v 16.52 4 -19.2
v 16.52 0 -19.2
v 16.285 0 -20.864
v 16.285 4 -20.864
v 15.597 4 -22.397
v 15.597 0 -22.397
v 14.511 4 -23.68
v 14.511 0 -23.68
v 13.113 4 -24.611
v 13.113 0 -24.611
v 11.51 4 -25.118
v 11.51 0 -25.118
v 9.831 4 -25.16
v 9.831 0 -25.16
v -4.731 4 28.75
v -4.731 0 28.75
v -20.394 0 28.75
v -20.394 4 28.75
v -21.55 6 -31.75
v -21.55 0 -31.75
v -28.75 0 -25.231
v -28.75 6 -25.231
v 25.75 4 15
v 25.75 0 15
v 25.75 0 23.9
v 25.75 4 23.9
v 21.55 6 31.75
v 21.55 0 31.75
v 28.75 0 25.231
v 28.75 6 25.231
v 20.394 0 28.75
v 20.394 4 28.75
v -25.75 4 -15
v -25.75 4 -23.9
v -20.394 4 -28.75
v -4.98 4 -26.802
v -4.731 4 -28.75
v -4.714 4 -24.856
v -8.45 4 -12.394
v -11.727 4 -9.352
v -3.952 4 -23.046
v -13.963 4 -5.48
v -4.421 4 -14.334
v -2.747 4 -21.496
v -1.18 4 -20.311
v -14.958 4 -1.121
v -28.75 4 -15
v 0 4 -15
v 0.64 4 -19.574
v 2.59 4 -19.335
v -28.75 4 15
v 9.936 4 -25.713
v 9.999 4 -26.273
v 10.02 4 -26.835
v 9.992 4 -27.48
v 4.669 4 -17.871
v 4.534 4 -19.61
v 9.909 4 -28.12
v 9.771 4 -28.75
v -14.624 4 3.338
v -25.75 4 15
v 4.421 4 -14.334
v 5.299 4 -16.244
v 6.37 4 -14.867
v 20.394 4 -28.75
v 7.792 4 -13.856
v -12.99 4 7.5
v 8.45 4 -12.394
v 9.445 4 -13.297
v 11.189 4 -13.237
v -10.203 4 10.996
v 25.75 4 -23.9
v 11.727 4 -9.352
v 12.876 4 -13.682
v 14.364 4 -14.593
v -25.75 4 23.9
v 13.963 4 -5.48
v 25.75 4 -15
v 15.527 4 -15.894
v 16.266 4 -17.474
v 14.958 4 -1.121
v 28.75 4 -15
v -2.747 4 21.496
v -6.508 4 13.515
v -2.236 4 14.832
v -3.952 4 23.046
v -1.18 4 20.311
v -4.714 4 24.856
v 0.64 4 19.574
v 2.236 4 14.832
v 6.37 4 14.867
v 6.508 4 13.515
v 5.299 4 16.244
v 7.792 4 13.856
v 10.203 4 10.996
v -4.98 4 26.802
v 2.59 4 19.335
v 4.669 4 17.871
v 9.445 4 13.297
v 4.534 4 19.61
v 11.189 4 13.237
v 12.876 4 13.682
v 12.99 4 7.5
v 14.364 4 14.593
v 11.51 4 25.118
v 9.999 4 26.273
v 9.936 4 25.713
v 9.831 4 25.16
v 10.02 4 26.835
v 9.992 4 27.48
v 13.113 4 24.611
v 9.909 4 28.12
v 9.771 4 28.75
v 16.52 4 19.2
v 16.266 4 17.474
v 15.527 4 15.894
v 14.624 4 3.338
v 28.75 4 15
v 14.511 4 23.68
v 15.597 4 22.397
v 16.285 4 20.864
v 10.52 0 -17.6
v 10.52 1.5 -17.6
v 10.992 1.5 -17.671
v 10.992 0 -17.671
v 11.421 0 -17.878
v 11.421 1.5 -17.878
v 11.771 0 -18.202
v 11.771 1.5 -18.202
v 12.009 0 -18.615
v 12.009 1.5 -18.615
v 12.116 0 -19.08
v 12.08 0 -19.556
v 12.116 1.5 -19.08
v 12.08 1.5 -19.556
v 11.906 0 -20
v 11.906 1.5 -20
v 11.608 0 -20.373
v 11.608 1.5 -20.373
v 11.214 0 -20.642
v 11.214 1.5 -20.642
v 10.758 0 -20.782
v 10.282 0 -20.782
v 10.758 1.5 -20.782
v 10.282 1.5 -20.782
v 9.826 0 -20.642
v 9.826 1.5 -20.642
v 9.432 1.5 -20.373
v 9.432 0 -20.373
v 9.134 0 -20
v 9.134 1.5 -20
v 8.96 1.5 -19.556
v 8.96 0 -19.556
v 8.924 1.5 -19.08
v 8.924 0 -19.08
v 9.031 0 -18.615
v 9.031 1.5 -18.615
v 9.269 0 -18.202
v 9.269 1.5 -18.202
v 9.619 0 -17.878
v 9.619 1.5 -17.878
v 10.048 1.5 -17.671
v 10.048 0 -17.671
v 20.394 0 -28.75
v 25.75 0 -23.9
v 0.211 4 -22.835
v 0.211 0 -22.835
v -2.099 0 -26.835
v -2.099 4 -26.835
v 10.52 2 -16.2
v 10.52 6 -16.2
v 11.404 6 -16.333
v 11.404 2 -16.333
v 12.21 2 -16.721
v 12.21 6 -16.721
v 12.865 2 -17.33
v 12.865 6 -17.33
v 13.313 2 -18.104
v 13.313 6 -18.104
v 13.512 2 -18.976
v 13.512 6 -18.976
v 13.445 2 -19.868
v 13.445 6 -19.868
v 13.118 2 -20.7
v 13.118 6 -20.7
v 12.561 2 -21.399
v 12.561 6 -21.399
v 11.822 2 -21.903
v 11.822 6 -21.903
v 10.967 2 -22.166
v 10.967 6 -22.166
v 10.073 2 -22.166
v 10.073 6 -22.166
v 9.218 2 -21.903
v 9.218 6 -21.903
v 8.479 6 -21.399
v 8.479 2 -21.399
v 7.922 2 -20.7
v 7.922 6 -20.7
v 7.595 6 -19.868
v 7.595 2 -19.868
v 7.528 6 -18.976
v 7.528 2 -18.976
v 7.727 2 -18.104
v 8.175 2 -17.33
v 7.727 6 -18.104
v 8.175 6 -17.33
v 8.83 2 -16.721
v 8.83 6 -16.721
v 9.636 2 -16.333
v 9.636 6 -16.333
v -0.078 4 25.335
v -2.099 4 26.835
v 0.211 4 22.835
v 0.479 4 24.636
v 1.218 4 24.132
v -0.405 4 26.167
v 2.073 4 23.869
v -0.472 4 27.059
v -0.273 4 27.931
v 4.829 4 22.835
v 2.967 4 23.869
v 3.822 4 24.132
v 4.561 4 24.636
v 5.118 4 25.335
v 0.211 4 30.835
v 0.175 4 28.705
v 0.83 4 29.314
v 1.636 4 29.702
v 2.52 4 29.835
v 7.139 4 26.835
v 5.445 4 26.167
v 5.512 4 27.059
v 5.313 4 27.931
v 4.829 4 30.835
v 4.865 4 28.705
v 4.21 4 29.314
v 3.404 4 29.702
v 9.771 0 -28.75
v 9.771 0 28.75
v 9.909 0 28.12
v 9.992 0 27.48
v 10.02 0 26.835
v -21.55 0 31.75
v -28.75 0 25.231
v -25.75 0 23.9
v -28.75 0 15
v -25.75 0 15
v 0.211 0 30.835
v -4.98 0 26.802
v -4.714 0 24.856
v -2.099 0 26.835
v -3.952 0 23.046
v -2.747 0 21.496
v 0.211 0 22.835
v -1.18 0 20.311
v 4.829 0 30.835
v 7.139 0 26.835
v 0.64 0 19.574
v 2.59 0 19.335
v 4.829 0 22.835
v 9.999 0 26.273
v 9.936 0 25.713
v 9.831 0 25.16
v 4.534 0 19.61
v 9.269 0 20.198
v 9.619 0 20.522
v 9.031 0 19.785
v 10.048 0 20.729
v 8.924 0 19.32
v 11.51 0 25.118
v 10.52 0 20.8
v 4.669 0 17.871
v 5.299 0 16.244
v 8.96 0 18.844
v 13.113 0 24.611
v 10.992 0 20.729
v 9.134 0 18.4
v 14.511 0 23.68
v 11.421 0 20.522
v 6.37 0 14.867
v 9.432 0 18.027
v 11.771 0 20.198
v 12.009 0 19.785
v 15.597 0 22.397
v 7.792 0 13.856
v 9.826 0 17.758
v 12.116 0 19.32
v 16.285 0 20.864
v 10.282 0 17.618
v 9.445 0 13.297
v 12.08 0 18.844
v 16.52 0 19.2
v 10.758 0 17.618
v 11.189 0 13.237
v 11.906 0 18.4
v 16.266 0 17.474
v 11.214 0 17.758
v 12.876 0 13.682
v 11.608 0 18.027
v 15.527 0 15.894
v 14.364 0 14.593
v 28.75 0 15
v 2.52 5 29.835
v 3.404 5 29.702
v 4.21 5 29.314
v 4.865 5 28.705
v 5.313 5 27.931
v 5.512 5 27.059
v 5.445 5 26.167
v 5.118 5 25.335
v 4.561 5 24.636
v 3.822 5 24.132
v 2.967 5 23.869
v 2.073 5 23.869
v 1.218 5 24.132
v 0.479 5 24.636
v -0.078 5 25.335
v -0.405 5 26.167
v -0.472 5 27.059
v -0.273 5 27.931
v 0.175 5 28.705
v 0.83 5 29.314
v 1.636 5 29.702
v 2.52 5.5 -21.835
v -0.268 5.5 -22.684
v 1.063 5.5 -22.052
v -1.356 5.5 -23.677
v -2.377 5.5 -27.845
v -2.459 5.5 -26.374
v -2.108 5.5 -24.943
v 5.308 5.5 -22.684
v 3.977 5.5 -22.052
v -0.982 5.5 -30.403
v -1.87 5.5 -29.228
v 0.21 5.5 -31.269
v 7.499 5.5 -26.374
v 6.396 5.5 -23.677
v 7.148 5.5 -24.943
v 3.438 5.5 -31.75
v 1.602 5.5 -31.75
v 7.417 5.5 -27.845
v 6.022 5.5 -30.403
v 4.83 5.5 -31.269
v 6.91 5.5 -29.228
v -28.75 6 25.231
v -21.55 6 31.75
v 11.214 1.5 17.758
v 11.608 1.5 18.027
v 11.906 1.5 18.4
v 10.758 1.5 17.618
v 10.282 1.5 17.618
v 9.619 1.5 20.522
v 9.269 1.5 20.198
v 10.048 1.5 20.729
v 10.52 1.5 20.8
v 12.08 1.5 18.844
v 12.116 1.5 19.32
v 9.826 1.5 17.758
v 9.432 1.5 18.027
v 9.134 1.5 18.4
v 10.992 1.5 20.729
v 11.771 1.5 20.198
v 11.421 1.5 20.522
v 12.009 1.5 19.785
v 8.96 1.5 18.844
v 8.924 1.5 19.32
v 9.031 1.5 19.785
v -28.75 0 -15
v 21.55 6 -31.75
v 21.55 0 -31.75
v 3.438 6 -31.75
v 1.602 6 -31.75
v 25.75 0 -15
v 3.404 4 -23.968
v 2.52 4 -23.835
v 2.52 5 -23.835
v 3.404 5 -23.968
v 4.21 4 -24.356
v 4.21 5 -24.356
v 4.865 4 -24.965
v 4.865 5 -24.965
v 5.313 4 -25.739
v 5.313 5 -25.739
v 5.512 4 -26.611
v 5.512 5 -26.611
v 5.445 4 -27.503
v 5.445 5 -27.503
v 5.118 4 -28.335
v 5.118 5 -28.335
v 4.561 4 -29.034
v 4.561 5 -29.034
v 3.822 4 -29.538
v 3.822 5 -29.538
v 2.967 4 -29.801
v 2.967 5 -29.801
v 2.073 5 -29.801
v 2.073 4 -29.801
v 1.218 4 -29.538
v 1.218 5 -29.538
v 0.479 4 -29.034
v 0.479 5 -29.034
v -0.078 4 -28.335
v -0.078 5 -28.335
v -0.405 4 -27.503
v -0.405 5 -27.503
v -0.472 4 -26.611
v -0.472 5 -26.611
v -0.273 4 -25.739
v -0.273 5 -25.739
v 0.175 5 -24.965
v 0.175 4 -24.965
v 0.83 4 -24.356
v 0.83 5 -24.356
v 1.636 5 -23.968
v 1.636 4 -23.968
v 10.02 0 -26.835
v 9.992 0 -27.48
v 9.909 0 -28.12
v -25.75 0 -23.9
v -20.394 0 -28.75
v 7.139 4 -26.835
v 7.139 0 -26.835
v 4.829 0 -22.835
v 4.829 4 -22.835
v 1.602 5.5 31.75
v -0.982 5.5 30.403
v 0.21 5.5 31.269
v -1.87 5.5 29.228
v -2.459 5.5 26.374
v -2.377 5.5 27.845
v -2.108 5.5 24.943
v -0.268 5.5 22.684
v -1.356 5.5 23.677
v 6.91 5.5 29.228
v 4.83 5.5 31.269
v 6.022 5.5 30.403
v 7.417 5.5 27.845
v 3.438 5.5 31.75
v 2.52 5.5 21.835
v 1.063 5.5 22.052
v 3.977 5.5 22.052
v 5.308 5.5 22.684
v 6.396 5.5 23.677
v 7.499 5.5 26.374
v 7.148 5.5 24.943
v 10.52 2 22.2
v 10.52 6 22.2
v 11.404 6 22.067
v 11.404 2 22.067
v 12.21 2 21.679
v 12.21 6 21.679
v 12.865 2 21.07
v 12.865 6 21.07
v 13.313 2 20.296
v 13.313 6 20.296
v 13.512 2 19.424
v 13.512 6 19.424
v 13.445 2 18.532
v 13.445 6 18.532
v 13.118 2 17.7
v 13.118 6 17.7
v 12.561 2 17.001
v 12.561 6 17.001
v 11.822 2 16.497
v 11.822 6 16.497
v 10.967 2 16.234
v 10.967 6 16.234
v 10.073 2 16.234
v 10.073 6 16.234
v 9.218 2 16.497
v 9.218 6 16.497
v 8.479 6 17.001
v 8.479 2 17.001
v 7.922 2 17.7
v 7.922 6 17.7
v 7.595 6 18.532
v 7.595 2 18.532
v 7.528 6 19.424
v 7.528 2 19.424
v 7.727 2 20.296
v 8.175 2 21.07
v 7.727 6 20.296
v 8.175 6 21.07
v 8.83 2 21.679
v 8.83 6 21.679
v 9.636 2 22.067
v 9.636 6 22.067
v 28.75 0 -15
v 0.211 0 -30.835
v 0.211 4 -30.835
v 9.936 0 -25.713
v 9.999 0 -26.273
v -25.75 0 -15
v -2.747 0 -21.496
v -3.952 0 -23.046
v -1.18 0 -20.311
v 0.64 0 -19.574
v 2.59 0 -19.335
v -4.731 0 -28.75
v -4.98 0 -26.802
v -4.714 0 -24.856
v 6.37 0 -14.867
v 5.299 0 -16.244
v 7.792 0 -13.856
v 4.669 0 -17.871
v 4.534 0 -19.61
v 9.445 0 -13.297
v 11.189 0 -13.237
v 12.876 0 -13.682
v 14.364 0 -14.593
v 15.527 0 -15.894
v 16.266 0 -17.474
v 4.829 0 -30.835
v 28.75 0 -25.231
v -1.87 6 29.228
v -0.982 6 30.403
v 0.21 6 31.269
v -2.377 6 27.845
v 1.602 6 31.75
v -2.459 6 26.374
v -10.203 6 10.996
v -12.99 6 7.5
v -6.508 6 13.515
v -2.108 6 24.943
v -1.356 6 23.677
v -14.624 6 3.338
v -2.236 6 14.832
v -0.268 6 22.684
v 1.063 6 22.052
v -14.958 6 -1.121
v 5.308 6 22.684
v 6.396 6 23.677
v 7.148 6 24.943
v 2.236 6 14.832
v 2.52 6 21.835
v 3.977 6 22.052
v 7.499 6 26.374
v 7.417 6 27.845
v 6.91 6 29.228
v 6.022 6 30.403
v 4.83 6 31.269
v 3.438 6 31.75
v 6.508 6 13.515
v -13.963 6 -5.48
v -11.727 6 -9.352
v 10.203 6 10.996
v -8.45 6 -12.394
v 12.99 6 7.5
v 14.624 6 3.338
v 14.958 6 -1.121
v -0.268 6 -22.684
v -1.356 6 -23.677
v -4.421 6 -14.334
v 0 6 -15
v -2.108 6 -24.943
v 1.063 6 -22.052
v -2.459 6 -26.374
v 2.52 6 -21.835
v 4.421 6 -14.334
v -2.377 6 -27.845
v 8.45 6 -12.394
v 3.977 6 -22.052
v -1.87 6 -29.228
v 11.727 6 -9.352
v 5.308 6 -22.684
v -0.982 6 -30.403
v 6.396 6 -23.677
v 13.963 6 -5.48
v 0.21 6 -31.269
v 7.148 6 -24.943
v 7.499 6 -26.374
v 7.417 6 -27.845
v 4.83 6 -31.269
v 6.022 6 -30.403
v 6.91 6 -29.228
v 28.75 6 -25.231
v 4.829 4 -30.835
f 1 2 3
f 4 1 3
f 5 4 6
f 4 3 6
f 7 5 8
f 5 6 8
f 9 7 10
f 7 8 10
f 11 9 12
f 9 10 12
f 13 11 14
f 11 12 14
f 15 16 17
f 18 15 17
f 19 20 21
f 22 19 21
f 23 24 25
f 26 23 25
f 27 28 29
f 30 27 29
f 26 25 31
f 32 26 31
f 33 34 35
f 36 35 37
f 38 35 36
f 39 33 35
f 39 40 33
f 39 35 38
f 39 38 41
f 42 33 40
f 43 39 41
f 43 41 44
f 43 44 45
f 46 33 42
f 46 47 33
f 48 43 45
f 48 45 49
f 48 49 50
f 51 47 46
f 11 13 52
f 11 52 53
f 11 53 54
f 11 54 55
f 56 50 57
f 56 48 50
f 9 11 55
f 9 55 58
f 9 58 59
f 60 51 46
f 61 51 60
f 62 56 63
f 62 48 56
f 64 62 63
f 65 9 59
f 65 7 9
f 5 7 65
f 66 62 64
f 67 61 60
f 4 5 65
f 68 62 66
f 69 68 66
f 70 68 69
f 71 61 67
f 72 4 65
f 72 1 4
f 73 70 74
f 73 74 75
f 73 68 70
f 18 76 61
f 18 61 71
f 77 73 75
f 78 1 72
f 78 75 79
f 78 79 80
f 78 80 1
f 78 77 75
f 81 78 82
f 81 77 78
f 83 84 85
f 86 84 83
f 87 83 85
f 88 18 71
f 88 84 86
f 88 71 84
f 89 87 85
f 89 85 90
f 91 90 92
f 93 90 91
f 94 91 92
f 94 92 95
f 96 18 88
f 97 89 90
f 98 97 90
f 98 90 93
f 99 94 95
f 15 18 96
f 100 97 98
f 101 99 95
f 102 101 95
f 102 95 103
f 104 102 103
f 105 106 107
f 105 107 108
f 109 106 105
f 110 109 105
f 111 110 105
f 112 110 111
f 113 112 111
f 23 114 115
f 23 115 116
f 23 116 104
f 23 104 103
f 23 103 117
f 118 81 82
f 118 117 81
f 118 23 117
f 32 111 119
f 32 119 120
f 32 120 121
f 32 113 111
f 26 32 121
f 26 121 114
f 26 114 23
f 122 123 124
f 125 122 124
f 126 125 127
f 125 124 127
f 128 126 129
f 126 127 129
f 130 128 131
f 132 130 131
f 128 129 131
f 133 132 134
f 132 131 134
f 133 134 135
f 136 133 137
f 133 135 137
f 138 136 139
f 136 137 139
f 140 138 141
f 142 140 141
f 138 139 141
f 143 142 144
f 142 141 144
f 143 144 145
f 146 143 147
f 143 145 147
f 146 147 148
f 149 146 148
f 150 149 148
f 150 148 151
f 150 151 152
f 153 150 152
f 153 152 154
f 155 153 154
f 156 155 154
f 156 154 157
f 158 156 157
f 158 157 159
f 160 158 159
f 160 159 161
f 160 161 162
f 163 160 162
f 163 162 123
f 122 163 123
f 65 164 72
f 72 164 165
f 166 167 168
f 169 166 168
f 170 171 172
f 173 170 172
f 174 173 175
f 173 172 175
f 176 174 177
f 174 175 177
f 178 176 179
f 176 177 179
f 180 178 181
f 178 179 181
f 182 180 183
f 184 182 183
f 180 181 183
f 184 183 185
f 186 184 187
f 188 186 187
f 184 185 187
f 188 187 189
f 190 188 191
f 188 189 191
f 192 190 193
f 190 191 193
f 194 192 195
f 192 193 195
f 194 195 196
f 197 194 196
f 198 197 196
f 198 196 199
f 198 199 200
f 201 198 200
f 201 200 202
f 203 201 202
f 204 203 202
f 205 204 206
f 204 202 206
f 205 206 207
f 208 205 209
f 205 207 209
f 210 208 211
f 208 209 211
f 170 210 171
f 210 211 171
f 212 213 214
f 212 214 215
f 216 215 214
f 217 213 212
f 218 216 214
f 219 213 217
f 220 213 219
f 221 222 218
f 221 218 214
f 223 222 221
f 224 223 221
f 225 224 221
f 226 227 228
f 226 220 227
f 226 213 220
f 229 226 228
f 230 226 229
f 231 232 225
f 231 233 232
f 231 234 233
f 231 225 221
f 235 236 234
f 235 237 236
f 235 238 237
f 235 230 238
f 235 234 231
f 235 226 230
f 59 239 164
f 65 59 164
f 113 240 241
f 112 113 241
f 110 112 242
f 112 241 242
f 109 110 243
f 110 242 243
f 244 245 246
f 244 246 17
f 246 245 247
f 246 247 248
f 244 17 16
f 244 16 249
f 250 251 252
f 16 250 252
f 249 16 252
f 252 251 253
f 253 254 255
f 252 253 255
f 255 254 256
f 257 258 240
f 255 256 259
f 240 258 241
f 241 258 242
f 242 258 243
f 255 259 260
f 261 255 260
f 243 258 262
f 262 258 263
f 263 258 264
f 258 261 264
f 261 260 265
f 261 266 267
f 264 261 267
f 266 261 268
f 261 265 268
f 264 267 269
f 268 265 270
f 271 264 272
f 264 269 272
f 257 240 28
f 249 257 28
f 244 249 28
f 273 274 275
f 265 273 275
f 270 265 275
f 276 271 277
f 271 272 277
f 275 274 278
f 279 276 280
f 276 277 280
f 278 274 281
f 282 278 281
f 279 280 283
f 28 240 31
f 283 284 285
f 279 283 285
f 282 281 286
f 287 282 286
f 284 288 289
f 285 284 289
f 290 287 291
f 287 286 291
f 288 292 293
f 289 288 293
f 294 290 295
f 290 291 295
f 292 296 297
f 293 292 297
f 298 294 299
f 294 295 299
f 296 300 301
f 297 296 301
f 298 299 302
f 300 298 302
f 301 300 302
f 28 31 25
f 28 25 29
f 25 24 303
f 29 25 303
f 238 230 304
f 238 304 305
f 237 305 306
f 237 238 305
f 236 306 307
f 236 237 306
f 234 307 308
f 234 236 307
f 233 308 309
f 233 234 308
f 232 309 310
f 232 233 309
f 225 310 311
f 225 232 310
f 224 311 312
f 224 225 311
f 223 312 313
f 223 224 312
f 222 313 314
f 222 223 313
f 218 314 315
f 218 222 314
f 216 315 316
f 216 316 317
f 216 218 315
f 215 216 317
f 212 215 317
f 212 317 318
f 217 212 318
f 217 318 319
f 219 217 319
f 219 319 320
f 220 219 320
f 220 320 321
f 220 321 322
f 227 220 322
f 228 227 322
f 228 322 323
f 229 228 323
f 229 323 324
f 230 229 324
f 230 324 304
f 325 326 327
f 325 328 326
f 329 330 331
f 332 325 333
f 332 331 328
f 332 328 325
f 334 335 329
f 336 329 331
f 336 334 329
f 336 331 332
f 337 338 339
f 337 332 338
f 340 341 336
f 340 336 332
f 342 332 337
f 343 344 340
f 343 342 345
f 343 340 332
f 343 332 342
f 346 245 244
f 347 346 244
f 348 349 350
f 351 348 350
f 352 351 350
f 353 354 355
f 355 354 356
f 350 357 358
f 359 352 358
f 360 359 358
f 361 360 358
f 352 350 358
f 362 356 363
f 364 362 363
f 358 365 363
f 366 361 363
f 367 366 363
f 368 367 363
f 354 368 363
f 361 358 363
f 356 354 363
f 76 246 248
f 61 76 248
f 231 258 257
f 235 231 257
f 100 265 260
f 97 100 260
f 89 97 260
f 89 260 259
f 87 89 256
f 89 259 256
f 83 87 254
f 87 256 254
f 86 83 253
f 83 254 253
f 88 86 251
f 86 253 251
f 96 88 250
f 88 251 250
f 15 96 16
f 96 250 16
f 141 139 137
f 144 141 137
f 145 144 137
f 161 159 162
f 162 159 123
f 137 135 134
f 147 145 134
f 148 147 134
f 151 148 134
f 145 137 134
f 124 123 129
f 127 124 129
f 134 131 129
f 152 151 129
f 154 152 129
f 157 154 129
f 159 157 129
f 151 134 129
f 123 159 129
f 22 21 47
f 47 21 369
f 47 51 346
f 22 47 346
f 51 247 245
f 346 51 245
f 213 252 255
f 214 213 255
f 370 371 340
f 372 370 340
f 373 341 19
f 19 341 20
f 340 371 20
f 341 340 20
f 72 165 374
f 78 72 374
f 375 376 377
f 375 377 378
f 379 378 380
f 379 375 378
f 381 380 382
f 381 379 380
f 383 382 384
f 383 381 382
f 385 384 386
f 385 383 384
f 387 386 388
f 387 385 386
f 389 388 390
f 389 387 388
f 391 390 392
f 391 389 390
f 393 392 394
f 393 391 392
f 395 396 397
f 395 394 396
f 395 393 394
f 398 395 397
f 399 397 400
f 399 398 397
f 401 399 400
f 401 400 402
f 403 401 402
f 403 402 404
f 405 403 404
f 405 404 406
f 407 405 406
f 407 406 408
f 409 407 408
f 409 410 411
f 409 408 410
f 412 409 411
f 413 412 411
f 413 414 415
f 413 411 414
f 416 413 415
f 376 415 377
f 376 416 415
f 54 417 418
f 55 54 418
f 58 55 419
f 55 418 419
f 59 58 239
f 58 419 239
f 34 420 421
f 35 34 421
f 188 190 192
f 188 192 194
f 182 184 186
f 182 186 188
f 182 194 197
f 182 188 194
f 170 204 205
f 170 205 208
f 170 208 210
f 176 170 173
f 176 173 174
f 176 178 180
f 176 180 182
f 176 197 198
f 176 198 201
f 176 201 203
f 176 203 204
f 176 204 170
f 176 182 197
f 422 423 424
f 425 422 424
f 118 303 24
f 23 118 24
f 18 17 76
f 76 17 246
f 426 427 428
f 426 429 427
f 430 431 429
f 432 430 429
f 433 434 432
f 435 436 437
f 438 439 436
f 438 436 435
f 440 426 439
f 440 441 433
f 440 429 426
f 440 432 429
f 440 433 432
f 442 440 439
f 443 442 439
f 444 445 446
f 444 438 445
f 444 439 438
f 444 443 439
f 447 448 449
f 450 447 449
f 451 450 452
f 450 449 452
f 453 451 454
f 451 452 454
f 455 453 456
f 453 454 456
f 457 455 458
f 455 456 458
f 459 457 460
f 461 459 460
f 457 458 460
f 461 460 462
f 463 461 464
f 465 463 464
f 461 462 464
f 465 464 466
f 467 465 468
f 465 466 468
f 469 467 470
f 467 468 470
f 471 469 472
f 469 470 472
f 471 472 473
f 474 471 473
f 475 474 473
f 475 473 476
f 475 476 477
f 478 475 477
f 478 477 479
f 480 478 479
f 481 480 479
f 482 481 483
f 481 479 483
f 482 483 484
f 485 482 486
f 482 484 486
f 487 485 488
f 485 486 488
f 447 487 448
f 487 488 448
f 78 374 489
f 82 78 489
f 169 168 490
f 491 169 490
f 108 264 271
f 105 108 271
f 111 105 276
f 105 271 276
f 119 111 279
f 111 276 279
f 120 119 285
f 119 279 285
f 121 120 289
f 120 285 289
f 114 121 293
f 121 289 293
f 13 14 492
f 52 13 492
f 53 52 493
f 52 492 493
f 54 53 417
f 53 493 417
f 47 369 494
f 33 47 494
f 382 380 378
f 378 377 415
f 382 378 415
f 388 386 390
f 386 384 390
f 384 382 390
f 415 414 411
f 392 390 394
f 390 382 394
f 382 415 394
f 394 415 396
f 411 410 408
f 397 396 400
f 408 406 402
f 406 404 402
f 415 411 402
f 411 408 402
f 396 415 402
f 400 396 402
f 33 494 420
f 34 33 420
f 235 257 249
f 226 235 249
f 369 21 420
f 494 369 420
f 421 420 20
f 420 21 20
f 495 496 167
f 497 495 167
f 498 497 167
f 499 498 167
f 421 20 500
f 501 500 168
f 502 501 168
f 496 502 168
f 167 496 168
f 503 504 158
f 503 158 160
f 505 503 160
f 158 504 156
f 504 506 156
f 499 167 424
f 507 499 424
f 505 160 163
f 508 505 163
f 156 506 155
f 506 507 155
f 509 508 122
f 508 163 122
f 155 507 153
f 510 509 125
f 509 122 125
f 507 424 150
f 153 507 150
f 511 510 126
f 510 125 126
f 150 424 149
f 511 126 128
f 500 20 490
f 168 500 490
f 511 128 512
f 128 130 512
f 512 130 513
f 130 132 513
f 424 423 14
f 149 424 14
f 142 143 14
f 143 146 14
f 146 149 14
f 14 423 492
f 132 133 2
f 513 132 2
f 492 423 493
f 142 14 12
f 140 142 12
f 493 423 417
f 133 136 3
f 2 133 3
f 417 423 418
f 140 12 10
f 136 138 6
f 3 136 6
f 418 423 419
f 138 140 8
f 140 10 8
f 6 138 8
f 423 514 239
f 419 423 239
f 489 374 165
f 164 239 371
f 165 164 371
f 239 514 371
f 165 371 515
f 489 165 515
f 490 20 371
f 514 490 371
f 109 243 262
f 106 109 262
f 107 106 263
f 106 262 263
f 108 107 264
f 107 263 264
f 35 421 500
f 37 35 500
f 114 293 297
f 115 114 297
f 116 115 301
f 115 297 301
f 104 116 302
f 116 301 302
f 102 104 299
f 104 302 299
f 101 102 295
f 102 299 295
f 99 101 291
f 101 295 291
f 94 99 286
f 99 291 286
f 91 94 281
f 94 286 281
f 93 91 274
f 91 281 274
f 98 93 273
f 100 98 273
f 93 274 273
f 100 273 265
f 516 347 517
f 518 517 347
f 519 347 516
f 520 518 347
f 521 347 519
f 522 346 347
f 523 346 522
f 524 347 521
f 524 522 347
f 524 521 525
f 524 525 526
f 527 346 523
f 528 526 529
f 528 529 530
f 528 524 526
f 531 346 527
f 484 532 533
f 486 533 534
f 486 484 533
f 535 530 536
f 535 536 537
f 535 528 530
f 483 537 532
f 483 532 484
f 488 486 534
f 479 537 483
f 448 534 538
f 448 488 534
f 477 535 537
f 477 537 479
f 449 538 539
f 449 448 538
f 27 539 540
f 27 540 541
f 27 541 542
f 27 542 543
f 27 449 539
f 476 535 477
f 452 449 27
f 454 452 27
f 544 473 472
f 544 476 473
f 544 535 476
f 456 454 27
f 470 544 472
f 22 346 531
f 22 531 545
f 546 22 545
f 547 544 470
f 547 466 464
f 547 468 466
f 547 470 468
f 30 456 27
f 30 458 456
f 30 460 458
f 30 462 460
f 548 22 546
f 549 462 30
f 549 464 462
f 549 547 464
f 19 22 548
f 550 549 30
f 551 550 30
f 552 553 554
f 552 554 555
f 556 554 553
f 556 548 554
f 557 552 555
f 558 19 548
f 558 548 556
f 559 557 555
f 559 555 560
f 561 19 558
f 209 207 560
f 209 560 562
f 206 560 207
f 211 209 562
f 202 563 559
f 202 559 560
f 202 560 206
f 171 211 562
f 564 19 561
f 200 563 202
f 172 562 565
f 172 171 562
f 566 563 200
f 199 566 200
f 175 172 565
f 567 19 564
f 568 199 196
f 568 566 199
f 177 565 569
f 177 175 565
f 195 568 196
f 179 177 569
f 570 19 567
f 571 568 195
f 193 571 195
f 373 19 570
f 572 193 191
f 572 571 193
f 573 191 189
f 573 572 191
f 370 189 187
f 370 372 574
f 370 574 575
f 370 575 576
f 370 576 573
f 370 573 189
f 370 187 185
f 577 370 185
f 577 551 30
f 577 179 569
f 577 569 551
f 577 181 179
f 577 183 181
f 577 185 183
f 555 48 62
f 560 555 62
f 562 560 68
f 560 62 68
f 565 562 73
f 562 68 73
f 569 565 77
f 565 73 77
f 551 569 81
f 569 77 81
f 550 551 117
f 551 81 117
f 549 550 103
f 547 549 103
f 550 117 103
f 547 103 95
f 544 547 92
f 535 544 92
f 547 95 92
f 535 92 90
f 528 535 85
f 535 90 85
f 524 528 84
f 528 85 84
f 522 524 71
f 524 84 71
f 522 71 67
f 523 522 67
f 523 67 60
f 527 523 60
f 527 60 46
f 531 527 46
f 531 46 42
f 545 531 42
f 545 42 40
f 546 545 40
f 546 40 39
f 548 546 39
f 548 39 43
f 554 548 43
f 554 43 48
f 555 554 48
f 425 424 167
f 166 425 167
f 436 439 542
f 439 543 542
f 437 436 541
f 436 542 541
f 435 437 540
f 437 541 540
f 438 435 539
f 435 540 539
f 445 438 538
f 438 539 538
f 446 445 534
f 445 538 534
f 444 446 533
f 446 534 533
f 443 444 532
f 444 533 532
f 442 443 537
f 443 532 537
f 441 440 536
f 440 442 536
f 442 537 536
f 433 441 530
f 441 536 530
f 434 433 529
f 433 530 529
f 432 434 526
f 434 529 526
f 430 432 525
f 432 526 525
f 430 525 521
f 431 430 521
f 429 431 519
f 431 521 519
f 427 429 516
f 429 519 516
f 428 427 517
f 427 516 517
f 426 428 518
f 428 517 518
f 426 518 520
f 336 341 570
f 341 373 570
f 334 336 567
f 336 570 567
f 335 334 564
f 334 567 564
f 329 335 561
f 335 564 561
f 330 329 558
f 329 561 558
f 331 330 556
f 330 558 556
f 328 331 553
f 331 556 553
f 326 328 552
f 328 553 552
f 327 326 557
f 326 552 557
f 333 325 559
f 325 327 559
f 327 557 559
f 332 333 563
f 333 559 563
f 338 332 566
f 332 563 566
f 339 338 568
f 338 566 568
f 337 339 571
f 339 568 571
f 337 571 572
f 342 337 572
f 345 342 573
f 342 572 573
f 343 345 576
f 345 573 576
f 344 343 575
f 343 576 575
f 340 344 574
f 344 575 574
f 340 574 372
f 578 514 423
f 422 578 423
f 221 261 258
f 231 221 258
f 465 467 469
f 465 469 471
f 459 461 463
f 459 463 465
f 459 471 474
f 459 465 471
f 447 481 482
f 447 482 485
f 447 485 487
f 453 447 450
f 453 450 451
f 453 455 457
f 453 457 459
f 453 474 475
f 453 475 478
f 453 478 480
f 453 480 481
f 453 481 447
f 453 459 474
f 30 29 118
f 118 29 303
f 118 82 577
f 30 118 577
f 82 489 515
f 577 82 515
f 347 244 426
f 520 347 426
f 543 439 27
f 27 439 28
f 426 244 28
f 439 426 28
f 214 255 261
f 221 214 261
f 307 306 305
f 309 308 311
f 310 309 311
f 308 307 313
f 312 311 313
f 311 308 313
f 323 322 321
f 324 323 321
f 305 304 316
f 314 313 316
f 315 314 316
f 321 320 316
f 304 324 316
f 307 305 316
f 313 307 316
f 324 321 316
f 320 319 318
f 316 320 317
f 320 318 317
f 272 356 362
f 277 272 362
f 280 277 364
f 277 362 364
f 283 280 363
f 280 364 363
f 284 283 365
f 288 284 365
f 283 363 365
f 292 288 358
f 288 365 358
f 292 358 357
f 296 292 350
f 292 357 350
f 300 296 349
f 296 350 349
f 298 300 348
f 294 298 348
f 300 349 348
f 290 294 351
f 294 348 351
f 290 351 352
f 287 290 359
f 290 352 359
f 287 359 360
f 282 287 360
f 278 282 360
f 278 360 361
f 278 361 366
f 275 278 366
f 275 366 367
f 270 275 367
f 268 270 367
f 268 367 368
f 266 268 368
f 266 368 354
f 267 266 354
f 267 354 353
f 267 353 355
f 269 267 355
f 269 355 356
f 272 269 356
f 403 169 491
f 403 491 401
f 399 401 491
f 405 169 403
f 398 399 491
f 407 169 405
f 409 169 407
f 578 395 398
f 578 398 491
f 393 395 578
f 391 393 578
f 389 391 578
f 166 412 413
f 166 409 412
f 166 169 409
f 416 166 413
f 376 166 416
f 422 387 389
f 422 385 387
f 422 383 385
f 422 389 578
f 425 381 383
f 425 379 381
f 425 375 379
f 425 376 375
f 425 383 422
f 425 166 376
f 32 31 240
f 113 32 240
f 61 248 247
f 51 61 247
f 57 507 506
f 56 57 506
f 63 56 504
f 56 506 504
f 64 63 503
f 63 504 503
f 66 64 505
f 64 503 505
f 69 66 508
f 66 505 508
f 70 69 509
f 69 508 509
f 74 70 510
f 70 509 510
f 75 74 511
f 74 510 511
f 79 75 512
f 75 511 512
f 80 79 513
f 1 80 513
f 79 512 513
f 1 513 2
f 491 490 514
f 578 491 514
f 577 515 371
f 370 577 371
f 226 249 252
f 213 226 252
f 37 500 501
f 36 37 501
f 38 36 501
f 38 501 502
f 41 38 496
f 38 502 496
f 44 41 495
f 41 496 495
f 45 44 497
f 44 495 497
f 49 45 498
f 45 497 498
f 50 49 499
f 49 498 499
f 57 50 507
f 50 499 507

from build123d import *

# Parameters (mm, degrees)
SKETCH_1_R          = 3
EXTRUDE_1_DEPTH     = 6
SKETCH_2_R          = 1.6
CUT_EXTRUDE_1_DEPTH = 7
SKETCH_3_R          = 3
SKETCH_3_R_2        = 1.6
CUT_EXTRUDE_2_DEPTH = 4
CUT_EXTRUDE_3_DEPTH = 4
SKETCH_6_R          = 5
CUT_EXTRUDE_4_DEPTH = 0.5
CUT_EXTRUDE_6_DEPTH = 4
EXTRUDE_START       = -0.5
SKETCH_8_R          = 3
EXTRUDE_2_DEPTH     = 0.5
SKETCH_9_R          = 1.6
EXTRUDE_3_DEPTH     = 0.5
SKETCH_10_R         = 15
CUT_EXTRUDE_7_DEPTH = 44.018891199


with BuildPart() as part:
    # 草图1 → 凸台-拉伸1 (new body)
    with BuildSketch(Plane(origin=(0, 0, 0), x_dir=(1, 0, 0), z_dir=(0, 1, 0))):
        Polygon((21.550377817, 31.75), (-21.550377817, 31.75), (-28.75, 25.230657078), (-28.75, -25.230657078), (-21.550377817, -31.75), (21.550377817, -31.75), (28.75, -25.230657078), (28.75, 25.230657078), align=None)
        with Locations(Location((2.52, -26.835, 0), (0, 0, 270))):
            Circle(SKETCH_1_R, mode=Mode.SUBTRACT)
        with Locations(Location((2.52, 26.835, 0), (0, 0, 270))):
            Circle(SKETCH_1_R, mode=Mode.SUBTRACT)
    extrude(amount=EXTRUDE_1_DEPTH)

    # 草图2 → 切除-拉伸1 (cut)
    with BuildSketch(Plane(origin=(0, 6, 0), x_dir=(1, 0, 0), z_dir=(0, 1, 0))):
        with Locations(Location((10.52, 19.2, 0), (0, 0, 270))):
            Circle(SKETCH_2_R)
        with Locations(Location((10.52, -19.2, 0), (0, 0, 270))):
            Circle(SKETCH_2_R)
    extrude(amount=-CUT_EXTRUDE_1_DEPTH, mode=Mode.SUBTRACT)

    # 草图3 → 切除-拉伸2 (cut)
    # profile 1 of 2: a face of its own
    with BuildSketch(Plane(origin=(0, 6, 0), x_dir=(1, 0, 0), z_dir=(0, 1, 0))):
        with Locations(Location((10.52, 19.2, 0), (0, 0, 270))):
            Circle(SKETCH_3_R)
        with Locations(Location((10.52, 19.2, 0), (0, 0, 270))):
            Circle(SKETCH_3_R_2, mode=Mode.SUBTRACT)
    # profile 2 of 2: a face of its own
    with BuildSketch(Plane(origin=(0, 6, 0), x_dir=(1, 0, 0), z_dir=(0, 1, 0))):
        with Locations(Location((10.52, -19.2, 0), (0, 0, 270))):
            Circle(SKETCH_3_R)
        with Locations(Location((10.52, -19.2, 0), (0, 0, 270))):
            Circle(SKETCH_3_R_2, mode=Mode.SUBTRACT)
    extrude(amount=-CUT_EXTRUDE_2_DEPTH, mode=Mode.SUBTRACT)

    # 草图5 → 切除-拉伸3 (cut)
    with BuildSketch(Plane.XZ):
        Polygon((7.138802154, 26.835), (4.829401077, 30.835), (0.210598923, 30.835), (-2.098802154, 26.835), (0.210598923, 22.835), (4.829401077, 22.835), align=None)
        Polygon((7.138802154, -26.835), (4.829401077, -22.835), (0.210598923, -22.835), (-2.098802154, -26.835), (0.210598923, -30.835), (4.829401077, -30.835), align=None)
    extrude(amount=-CUT_EXTRUDE_3_DEPTH, mode=Mode.SUBTRACT)

    # 草图6 → 切除-拉伸4 (cut)
    with BuildSketch(Plane(origin=(0, 6, 0), x_dir=(1, 0, 0), z_dir=(0, 1, 0))):
        with Locations((2.52, 26.835)):
            Circle(SKETCH_6_R)
        with Locations((2.52, -26.835)):
            Circle(SKETCH_6_R)
    extrude(amount=-CUT_EXTRUDE_4_DEPTH, mode=Mode.SUBTRACT)

    # 草图7 → 切除-拉伸6 (cut)
    with BuildSketch(Plane.XZ):
        with BuildLine():
            Line((9.771398141, -28.75), (20.393940666, -28.75))
            Line((20.393940666, -28.75), (25.75, -23.900025013))
            Line((25.75, -23.900025013), (25.75, -15))
            Line((25.75, -15), (28.75, -15))
            Line((28.75, -15), (28.75, 15))
            Line((28.75, 15), (25.75, 15))
            Line((25.75, 15), (25.75, 23.900025013))
            Line((25.75, 23.900025013), (20.393940666, 28.75))
            Line((20.393940666, 28.75), (9.771398141, 28.75))
            ThreePointArc((9.771398141, 28.75), (9.957589867, 27.800534552), (10.02, 26.835))
            ThreePointArc((10.02, 26.835), (9.972506325, 25.992296328), (9.830626806, 25.160265481))
            ThreePointArc((9.830626806, 25.160265481), (14.51147597, 23.679745482), (16.52, 19.2))
            ThreePointArc((16.52, 19.2), (10.314635532, 13.203515577), (4.534058188, 19.610488278))
            ThreePointArc((4.534058188, 19.610488278), (-2.746887228, 21.495533835), (-4.731398141, 28.75))
            Line((-4.731398141, 28.75), (-20.393940666, 28.75))
            Line((-20.393940666, 28.75), (-25.75, 23.900025013))
            Line((-25.75, 23.900025013), (-25.75, 15))
            Line((-25.75, 15), (-28.75, 15))
            Line((-28.75, 15), (-28.75, -15))
            Line((-28.75, -15), (-25.75, -15))
            Line((-25.75, -15), (-25.75, -23.900025013))
            Line((-25.75, -23.900025013), (-20.393940666, -28.75))
            Line((-20.393940666, -28.75), (-4.731398141, -28.75))
            ThreePointArc((-4.731398141, -28.75), (-2.746887228, -21.495533835), (4.534058188, -19.610488278))
            ThreePointArc((4.534058188, -19.610488278), (10.314635532, -13.203515577), (16.52, -19.2))
            ThreePointArc((16.52, -19.2), (14.51147597, -23.679745482), (9.830626806, -25.160265481))
            ThreePointArc((9.830626806, -25.160265481), (9.972506325, -25.992296328), (10.02, -26.835))
            ThreePointArc((10.02, -26.835), (9.957589867, -27.800534552), (9.771398141, -28.75))
        make_face()
    extrude(amount=-CUT_EXTRUDE_6_DEPTH, mode=Mode.SUBTRACT)

    # 草图8 → 凸台-拉伸2 (add)
    with BuildSketch(Plane(origin=(0, 5.5, 0), x_dir=(1, 0, 0), z_dir=(0, 1, 0)).offset(EXTRUDE_START)):
        with Locations(Location((2.52, 26.835, 0), (0, 0, 90))):
            Circle(SKETCH_8_R)
        with Locations(Location((2.52, -26.835, 0), (0, 0, 90))):
            Circle(SKETCH_8_R)
    extrude(amount=EXTRUDE_2_DEPTH)

    # 草图9 → 凸台-拉伸3 (add)
    with BuildSketch(Plane(origin=(0, 2, 0), x_dir=(1, 0, 0), z_dir=(0, 1, 0))):
        with Locations(Location((10.52, -19.2, 0), (0, 0, 270))):
            Circle(SKETCH_9_R)
        with Locations(Location((10.52, 19.2, 0), (0, 0, 270))):
            Circle(SKETCH_9_R)
    extrude(amount=-EXTRUDE_3_DEPTH)

    # 草图10 → 切除-拉伸7 (cut, through all)
    with BuildSketch(Plane.XZ.offset(-4)):
        with Locations(Location((0, 0, 0), (0, 0, 270))):
            Circle(SKETCH_10_R)
    extrude(amount=-CUT_EXTRUDE_7_DEPTH, mode=Mode.SUBTRACT)


solid = part.part
